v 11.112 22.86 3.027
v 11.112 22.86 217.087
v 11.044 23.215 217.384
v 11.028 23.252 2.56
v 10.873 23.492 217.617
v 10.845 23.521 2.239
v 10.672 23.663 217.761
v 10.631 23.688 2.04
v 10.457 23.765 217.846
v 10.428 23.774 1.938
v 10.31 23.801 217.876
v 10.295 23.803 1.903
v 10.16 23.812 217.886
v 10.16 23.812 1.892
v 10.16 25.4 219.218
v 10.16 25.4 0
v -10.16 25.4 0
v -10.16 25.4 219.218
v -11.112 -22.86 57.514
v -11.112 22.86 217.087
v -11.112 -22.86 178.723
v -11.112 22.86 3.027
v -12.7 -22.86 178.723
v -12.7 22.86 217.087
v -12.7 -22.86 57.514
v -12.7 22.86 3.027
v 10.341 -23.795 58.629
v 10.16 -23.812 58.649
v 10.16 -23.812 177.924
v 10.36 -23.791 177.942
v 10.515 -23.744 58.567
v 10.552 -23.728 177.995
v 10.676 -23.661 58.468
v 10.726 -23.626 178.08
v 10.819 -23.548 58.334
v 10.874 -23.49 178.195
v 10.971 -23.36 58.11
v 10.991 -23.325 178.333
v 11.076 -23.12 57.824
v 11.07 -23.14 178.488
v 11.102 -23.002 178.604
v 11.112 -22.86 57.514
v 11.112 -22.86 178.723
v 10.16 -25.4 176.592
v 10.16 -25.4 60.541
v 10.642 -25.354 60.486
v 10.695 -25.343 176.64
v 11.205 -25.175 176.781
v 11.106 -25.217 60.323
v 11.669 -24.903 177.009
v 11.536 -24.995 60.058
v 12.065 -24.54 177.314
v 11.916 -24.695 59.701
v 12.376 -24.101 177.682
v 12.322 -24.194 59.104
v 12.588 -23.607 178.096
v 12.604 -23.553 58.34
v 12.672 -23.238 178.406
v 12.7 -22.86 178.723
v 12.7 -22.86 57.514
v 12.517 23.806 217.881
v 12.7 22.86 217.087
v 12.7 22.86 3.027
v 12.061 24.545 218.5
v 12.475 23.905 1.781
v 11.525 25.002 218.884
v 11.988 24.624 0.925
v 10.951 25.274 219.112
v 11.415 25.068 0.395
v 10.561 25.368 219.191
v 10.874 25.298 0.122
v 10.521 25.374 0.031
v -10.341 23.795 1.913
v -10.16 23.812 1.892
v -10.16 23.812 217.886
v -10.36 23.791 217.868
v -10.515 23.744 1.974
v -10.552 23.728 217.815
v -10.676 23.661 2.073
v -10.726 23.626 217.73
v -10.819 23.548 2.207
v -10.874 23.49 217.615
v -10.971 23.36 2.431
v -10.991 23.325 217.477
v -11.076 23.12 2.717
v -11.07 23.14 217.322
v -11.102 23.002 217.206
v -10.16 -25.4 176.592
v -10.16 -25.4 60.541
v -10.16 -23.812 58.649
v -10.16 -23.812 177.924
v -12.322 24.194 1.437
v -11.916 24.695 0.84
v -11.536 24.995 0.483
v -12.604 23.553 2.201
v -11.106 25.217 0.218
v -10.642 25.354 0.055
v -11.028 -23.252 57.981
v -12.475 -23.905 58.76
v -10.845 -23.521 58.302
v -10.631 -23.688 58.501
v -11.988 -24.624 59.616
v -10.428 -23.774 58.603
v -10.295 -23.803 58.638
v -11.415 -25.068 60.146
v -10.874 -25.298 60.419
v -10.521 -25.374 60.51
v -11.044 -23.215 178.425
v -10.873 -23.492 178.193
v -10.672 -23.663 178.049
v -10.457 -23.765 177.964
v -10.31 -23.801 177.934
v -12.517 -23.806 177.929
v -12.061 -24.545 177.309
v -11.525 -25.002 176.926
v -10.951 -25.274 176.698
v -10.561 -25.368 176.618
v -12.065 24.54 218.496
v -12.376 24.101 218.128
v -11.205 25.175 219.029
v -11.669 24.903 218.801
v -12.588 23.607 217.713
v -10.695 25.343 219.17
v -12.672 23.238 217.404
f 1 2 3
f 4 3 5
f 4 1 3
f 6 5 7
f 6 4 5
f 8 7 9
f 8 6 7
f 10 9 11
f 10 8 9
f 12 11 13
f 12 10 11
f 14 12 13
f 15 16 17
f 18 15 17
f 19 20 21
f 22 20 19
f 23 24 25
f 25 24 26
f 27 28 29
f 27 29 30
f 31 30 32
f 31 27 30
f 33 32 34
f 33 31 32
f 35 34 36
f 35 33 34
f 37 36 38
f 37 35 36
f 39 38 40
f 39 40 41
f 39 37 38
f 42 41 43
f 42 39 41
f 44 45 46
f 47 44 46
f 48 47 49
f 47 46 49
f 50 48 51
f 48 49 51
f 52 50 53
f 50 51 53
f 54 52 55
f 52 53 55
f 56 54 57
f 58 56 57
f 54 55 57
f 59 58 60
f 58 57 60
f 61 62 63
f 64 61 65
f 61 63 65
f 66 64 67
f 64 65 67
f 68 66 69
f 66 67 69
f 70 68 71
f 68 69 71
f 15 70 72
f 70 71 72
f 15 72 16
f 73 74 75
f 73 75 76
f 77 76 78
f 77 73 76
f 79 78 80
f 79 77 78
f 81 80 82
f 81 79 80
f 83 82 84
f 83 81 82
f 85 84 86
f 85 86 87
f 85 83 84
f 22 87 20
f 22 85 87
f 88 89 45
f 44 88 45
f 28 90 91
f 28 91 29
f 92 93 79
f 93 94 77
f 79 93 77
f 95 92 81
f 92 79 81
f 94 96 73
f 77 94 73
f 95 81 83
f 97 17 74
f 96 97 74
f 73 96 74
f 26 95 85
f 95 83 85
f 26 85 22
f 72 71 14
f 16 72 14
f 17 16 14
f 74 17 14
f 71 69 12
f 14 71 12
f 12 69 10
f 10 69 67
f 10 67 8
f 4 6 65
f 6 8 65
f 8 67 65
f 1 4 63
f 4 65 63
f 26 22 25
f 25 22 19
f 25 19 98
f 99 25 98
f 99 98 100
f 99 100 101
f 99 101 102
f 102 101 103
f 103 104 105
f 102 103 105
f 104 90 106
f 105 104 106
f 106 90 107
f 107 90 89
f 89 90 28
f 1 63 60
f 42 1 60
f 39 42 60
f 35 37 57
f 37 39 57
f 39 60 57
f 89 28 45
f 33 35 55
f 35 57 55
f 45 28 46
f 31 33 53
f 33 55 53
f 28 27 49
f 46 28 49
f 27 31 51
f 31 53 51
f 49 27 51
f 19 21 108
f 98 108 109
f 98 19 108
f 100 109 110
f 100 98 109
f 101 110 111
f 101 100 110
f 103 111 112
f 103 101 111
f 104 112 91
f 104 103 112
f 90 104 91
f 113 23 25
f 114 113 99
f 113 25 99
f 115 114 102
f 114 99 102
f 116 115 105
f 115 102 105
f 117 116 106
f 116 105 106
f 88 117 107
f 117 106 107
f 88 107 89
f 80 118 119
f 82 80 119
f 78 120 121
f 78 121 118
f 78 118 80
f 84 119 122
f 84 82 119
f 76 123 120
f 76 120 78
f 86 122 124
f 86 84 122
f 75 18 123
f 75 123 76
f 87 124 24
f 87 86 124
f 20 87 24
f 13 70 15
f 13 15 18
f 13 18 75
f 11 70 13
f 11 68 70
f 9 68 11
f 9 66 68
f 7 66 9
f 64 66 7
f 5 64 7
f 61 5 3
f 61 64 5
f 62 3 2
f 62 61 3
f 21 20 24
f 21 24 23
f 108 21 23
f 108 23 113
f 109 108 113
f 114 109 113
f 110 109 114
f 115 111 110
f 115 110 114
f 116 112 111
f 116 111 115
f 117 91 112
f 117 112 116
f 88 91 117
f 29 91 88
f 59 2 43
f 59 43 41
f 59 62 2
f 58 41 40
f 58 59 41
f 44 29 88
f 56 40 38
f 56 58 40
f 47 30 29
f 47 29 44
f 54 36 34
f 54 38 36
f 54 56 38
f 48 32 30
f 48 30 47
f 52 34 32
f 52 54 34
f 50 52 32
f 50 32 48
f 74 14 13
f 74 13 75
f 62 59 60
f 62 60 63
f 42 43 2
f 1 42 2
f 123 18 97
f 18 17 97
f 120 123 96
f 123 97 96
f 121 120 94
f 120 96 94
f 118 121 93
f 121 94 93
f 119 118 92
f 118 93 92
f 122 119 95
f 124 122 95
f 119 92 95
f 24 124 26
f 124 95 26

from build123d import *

# Parameters (mm, degrees)
EXTRUDE_THIN1_DEPTH = 219.218052
CUT_EXTRUDE1_DEPTH  = 223.141563699


with BuildPart() as part:
    # Sketch1 → Extrude-Thin1 (new body)
    with BuildSketch(Plane.XY):
        with BuildLine():
            Line((-12.7, 22.86), (-12.7, -22.86))
            ThreePointArc((-12.7, -22.86), (-11.956051224, -24.656051224), (-10.16, -25.4))
            Line((-10.16, -25.4), (10.16, -25.4))
            ThreePointArc((10.16, -25.4), (11.956051224, -24.656051224), (12.7, -22.86))
            Line((12.7, -22.86), (12.7, 22.86))
            ThreePointArc((12.7, 22.86), (11.956051224, 24.656051224), (10.16, 25.4))
            Line((10.16, 25.4), (-10.16, 25.4))
            ThreePointArc((-10.16, 25.4), (-11.956051224, 24.656051224), (-12.7, 22.86))
        make_face()
        with BuildLine():
            Line((-11.1125, 22.86), (-11.1125, -22.86))
            ThreePointArc((-11.1125, -22.86), (-10.833519209, -23.533519209), (-10.16, -23.8125))
            Line((-10.16, -23.8125), (10.16, -23.8125))
            ThreePointArc((10.16, -23.8125), (10.833519209, -23.533519209), (11.1125, -22.86))
            Line((11.1125, -22.86), (11.1125, 22.86))
            ThreePointArc((11.1125, 22.86), (10.833519209, 23.533519209), (10.16, 23.8125))
            Line((10.16, 23.8125), (-10.16, 23.8125))
            ThreePointArc((-10.16, 23.8125), (-10.833519209, 23.533519209), (-11.1125, 22.86))
        make_face(mode=Mode.SUBTRACT)
    extrude(amount=EXTRUDE_THIN1_DEPTH)

    # Sketch2 → Cut-Extrude1 (cut, through all)
    with BuildSketch(Plane(origin=(12.7, 0, 0), x_dir=(0, 0, -1), z_dir=(1, 0, 0))):
        Polygon((-219.218051789, 25.4), (-176.591790525, -25.4), (-219.218051789, -25.4), align=None)
        Polygon((0, 25.4), (-60.541082504, -25.4), (0, -25.4), align=None)
    extrude(amount=-CUT_EXTRUDE1_DEPTH, mode=Mode.SUBTRACT)


solid = part.part
